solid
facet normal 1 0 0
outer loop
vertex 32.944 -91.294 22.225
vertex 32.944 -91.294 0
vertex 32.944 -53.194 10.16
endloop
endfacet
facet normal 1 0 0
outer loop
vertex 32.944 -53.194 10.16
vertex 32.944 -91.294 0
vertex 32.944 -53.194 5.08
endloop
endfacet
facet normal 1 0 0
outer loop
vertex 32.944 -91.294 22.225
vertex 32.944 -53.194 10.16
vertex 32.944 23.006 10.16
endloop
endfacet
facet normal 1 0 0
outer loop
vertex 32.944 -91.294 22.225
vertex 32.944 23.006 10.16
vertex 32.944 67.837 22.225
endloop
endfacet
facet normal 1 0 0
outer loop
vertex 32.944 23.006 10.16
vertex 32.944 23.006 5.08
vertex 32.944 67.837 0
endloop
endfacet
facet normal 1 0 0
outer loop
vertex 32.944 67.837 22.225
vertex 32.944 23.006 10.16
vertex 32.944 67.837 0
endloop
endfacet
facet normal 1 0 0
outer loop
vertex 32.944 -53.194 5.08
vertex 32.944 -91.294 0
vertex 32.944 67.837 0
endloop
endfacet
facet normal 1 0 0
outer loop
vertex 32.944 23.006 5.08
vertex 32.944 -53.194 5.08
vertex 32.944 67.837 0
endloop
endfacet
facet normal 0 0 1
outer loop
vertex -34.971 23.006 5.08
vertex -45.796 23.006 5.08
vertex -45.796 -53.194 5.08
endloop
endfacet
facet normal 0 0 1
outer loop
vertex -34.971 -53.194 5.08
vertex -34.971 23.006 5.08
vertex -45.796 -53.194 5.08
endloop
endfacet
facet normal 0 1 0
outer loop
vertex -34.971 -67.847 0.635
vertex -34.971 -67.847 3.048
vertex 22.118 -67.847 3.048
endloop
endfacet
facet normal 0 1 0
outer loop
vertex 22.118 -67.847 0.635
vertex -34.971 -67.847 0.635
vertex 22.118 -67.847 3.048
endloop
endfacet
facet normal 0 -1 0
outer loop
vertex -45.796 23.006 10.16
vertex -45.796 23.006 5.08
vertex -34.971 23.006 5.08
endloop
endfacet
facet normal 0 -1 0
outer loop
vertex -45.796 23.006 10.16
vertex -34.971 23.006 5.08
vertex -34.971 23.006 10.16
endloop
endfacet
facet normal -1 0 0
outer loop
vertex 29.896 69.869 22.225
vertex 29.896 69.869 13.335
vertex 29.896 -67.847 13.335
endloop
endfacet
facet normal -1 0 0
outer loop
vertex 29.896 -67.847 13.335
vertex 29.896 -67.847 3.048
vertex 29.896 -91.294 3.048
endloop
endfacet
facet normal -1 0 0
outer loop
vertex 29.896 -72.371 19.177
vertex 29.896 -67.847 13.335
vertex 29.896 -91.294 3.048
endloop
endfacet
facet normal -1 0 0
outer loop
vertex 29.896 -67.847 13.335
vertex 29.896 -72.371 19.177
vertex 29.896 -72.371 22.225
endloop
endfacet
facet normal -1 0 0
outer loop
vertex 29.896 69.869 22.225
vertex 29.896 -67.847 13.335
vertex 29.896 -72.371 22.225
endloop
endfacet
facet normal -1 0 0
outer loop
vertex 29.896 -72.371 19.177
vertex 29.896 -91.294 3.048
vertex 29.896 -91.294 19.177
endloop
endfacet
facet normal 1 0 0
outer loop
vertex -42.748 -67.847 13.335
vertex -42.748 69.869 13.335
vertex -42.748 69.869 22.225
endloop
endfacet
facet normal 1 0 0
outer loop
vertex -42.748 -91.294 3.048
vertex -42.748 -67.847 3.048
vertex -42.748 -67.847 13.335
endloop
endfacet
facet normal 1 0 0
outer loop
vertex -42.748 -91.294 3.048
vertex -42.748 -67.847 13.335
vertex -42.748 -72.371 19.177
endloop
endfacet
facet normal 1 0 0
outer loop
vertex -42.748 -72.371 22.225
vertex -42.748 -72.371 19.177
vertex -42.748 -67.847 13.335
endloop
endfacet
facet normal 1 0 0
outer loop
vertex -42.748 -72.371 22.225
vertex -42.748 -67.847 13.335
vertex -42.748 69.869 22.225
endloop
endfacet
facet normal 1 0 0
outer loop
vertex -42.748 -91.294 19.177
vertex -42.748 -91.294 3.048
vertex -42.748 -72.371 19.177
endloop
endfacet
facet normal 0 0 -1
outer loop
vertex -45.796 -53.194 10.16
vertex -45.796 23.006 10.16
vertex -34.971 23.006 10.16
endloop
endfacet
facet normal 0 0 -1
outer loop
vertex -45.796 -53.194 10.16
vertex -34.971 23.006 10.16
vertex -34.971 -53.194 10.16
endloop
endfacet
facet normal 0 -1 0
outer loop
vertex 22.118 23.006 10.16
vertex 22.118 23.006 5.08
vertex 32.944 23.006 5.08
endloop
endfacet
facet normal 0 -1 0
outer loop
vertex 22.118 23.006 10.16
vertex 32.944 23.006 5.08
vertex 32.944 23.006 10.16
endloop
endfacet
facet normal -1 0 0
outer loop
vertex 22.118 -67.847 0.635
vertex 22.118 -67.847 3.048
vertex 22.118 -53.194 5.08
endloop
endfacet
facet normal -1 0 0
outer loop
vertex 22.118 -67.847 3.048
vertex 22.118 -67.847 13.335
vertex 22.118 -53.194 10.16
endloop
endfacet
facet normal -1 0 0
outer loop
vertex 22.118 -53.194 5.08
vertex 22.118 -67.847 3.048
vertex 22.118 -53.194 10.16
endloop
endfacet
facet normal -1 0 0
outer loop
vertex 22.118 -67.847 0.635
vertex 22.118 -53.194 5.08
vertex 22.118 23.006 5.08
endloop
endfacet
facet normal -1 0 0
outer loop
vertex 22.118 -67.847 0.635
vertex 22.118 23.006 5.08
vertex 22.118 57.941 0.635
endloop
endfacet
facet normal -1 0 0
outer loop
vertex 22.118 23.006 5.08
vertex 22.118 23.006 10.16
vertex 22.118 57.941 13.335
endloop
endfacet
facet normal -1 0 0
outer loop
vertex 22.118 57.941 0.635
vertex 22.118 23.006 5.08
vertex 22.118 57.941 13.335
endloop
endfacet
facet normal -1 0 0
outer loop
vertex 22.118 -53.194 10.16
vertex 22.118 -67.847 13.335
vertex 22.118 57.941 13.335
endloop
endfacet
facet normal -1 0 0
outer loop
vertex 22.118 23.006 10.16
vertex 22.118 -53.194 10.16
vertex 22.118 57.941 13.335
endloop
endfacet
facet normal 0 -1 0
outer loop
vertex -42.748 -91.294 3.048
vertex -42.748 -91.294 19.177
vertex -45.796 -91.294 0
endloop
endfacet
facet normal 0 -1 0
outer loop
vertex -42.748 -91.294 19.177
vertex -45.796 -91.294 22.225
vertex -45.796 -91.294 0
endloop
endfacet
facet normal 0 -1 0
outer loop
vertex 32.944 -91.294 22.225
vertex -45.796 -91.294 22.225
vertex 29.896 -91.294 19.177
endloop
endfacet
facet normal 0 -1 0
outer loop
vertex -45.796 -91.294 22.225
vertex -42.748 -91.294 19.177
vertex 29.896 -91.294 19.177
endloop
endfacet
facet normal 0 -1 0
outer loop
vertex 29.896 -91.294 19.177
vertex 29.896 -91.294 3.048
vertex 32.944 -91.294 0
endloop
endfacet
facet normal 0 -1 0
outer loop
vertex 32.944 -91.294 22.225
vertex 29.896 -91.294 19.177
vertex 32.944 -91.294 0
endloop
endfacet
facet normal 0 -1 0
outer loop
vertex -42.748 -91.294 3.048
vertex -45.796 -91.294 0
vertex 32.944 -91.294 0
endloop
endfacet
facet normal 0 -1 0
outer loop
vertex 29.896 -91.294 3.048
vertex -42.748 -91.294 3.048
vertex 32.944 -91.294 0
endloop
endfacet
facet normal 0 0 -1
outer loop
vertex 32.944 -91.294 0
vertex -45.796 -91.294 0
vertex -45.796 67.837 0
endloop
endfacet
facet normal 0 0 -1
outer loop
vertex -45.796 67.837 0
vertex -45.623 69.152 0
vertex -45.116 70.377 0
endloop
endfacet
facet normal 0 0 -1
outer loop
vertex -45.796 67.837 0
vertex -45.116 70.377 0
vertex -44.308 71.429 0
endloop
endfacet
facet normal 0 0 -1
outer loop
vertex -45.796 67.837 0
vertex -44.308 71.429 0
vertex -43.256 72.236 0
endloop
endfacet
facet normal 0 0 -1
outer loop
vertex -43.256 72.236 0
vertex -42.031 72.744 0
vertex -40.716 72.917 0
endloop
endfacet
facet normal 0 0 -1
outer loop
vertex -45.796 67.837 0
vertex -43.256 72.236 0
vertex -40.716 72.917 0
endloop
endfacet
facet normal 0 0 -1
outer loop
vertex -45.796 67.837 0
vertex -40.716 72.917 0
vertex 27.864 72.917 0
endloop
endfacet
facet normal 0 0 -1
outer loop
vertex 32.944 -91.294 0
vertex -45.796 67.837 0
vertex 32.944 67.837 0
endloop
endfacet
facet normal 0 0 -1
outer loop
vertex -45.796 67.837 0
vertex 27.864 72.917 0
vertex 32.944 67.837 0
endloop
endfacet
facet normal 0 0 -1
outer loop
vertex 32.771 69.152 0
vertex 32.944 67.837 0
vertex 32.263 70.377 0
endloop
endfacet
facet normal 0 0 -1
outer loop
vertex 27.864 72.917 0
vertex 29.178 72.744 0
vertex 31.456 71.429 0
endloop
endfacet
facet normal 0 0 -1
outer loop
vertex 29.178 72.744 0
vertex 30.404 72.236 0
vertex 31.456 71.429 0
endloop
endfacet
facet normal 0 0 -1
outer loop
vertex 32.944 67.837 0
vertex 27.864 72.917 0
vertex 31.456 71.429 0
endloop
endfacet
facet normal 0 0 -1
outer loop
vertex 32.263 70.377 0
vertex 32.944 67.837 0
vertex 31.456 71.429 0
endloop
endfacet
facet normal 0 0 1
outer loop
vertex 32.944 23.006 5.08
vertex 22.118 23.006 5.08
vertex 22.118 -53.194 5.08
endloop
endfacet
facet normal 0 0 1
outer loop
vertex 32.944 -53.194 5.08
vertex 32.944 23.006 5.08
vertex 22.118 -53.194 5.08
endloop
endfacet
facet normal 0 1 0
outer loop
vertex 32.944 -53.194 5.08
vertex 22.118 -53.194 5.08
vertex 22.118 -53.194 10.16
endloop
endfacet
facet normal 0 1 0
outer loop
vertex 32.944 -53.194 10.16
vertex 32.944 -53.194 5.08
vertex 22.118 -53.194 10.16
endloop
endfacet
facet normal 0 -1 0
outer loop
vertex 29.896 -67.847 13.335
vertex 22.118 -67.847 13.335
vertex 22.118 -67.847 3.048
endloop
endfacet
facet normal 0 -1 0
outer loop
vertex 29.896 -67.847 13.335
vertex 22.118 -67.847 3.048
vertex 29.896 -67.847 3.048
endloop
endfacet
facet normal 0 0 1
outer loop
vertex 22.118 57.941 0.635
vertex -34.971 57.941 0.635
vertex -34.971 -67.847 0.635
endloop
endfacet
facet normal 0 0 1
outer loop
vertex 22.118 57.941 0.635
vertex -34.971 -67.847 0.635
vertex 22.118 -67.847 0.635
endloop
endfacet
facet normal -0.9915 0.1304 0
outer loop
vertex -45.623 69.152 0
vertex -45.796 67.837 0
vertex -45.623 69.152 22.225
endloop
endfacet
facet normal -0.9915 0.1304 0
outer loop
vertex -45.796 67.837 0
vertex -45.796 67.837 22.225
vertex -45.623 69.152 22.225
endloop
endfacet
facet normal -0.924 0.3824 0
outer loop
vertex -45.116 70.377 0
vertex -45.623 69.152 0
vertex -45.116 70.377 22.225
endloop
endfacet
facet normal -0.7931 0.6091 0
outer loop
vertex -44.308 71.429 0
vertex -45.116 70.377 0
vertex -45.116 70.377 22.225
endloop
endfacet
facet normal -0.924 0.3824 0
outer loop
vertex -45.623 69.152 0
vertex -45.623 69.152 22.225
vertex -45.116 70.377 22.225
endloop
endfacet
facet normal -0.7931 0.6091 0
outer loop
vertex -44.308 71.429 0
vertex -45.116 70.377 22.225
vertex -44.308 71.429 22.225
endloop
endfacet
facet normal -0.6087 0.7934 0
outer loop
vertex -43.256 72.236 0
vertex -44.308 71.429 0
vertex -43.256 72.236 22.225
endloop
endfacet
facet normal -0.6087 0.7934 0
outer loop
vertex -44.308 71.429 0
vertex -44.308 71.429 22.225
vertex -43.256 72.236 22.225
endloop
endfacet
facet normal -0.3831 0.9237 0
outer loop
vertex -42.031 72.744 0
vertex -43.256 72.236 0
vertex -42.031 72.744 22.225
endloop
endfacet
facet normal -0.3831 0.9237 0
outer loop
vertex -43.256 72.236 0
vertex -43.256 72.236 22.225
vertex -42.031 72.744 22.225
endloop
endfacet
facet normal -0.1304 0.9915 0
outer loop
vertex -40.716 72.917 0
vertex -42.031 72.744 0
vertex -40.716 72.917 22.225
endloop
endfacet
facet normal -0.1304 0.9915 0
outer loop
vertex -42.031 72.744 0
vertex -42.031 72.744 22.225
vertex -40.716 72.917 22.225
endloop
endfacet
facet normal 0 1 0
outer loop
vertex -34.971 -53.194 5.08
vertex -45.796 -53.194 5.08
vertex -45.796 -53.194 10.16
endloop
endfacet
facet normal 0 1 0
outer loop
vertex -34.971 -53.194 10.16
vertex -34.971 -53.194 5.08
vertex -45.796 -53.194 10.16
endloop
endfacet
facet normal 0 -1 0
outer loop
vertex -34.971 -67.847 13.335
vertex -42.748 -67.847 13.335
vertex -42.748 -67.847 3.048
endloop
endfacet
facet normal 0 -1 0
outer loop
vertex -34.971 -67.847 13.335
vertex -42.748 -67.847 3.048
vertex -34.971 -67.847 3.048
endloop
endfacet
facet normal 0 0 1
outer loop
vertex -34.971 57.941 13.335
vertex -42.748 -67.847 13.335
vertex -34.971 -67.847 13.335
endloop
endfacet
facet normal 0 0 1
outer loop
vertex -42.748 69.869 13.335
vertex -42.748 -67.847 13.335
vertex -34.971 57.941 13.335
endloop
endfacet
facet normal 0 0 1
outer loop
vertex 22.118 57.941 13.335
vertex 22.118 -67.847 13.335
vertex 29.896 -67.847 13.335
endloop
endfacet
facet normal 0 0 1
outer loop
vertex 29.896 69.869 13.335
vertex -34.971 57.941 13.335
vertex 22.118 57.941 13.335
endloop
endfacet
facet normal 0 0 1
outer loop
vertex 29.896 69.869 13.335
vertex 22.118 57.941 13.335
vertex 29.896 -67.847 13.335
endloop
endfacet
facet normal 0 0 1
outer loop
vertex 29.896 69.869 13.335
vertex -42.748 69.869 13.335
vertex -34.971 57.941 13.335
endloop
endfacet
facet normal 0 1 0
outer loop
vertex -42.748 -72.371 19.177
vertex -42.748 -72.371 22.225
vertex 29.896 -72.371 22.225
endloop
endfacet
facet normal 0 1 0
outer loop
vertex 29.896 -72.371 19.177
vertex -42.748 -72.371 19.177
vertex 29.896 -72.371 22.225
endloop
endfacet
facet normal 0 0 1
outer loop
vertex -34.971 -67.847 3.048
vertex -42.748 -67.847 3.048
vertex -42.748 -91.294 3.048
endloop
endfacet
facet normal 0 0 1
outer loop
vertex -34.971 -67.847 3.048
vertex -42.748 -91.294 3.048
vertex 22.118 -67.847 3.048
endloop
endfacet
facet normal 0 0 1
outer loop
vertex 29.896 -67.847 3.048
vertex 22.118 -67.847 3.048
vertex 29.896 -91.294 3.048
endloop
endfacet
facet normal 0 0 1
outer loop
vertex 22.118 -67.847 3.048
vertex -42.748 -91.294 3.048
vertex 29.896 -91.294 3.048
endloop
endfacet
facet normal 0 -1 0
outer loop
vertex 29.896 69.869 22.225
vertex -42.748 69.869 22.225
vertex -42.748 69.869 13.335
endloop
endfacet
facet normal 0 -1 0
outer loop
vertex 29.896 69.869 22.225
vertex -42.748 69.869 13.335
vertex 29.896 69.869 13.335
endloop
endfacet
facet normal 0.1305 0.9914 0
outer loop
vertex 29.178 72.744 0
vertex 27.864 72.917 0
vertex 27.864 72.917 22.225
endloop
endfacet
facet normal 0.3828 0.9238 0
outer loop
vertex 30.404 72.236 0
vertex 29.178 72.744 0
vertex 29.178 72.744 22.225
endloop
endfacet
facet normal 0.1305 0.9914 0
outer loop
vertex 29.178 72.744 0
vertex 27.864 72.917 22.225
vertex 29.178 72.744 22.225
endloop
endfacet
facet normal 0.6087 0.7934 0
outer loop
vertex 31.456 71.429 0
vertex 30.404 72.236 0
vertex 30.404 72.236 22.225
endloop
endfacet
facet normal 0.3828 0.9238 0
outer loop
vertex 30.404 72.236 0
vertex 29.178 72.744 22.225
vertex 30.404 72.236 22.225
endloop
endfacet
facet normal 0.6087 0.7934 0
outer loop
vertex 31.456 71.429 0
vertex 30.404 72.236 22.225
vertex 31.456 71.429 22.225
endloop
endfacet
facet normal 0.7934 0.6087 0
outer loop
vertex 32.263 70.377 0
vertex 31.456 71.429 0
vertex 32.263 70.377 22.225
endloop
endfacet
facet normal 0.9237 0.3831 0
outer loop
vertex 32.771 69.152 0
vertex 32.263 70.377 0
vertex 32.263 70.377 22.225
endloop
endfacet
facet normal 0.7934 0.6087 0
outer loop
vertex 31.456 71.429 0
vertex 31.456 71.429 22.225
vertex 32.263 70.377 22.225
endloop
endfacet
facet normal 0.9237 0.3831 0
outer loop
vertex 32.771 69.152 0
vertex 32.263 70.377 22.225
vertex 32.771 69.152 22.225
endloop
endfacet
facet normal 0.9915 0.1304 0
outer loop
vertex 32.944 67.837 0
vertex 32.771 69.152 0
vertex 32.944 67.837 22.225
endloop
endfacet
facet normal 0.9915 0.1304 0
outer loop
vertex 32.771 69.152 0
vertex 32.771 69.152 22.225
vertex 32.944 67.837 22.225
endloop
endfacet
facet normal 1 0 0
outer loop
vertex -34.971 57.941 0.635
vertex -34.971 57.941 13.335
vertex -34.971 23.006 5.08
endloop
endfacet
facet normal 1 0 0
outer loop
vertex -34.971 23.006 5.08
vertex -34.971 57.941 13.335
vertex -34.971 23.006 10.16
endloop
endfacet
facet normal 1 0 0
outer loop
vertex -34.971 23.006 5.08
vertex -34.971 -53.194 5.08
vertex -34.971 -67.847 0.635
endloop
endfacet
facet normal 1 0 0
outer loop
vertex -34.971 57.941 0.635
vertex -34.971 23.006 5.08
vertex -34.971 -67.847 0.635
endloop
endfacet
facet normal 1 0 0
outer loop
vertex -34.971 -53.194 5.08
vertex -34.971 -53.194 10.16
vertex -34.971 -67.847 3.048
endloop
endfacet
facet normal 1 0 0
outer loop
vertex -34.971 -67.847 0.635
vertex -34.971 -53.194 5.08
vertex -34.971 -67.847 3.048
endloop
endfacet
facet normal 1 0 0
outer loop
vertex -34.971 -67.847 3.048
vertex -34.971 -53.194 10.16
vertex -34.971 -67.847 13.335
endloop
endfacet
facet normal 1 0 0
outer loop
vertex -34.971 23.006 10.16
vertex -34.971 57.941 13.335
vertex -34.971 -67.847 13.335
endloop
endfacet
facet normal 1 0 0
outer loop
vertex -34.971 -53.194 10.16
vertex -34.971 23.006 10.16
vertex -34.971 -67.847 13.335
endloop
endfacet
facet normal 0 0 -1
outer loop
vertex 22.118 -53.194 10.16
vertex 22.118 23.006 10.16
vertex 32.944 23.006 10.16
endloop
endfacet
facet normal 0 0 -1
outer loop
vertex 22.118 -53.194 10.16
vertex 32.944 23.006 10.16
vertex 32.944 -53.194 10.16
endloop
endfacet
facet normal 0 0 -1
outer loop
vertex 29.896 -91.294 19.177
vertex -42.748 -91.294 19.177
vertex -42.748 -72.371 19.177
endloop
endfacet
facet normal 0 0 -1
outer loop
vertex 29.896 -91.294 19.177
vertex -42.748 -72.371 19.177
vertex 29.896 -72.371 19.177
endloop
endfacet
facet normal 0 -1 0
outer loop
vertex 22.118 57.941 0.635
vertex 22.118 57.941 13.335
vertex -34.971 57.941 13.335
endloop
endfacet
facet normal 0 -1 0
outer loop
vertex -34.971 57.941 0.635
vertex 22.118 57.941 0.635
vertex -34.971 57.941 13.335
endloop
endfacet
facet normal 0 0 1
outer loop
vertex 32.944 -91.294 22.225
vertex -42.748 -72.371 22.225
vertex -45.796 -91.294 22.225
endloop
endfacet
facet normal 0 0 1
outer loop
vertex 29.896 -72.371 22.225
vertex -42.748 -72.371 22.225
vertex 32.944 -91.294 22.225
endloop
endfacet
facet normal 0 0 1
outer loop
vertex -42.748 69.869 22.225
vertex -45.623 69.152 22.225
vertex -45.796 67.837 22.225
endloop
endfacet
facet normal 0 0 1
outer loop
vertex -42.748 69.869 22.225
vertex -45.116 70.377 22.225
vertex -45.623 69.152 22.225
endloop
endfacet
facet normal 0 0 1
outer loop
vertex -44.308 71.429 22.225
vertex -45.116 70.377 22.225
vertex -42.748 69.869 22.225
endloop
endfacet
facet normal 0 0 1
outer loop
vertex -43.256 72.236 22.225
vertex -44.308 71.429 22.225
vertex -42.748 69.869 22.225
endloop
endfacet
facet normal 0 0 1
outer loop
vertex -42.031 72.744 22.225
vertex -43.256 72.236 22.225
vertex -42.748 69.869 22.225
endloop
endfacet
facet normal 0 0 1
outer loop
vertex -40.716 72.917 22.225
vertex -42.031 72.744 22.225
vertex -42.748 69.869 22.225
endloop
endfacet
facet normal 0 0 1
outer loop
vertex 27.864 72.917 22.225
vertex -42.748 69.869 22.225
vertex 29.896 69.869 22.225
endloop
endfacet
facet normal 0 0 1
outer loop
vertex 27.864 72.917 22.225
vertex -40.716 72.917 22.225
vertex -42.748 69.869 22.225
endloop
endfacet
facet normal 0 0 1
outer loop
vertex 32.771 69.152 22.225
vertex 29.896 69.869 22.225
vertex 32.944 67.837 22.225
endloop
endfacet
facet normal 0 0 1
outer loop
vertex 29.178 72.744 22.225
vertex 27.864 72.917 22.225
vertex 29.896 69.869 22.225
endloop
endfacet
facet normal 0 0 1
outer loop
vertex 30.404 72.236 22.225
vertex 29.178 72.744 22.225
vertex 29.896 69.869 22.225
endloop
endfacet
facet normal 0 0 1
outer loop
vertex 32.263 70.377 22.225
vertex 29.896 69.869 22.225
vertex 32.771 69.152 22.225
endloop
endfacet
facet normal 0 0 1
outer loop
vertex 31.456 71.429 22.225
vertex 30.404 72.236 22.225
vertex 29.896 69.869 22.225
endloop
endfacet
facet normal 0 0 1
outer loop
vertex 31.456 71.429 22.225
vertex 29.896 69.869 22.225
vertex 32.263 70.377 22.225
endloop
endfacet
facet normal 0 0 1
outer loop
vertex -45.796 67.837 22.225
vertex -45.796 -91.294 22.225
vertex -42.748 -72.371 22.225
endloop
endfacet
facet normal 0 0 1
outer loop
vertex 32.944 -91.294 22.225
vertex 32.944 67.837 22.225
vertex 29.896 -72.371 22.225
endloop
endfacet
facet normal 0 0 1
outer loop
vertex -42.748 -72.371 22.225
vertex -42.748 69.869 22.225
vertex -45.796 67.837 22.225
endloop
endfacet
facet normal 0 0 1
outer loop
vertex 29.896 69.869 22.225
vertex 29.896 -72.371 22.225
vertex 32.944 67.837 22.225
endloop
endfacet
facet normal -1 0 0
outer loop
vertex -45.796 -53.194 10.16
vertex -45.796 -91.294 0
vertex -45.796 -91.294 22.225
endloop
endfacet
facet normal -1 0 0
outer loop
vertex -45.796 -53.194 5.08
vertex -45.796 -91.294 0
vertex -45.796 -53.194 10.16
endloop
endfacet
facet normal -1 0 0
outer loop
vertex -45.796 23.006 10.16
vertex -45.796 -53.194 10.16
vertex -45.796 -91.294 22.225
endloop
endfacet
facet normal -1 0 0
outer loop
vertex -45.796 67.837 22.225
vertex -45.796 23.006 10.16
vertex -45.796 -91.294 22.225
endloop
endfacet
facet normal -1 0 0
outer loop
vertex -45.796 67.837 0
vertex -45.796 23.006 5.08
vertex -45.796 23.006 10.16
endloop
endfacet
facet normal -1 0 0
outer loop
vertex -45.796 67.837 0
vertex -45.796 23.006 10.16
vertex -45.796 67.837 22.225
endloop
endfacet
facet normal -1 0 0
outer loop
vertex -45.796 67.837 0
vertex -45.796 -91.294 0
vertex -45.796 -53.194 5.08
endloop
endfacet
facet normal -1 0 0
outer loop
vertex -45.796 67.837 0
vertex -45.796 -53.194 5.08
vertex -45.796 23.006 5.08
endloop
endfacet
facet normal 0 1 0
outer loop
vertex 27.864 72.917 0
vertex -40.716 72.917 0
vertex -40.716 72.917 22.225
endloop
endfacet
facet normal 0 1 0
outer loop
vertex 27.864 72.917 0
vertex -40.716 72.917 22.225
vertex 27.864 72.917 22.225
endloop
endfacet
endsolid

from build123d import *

# Parameters (mm, degrees)
F0_W      = 78.74
F0_H      = 148.336
F1_DEPTH  = 22.225
F2_W      = 72.644
F2_H      = 142.24
F3_DEPTH  = 8.89
F5_DEPTH  = 12.7
F0_H_2    = 15.875
F6_DEPTH  = 22.225
F7_W      = 72.644
F7_H      = 16.129
F8_DEPTH  = 23.447496
F9_W      = 76.2
F9_H      = 5.08
F10_DEPTH = 78.74
F11_R     = 5.08


with BuildPart() as f1:
    # F0 (on Top) → F1 (new body)
    with BuildSketch(Plane.XY):
        with Locations((-6.426373, -1.251059)):
            Rectangle(F0_W, F0_H)
    extrude(amount=F1_DEPTH)

    # F2 (on face) → F3 (cut)
    with BuildSketch(Plane.XY.offset(22.225)):
        with Locations((-6.426373, -1.251059)):
            Rectangle(F2_W, F2_H)
    extrude(amount=-F3_DEPTH, mode=Mode.SUBTRACT)

    # F4 (on face) → F5 (cut)
    with BuildSketch(Plane.XY.offset(13.335)):
        Polygon((-6.426373, 57.940908), (-34.970604, 57.940908), (-34.970604, -67.846563), (22.117858, -67.846563), (22.117858, 57.940908), align=None)
    extrude(amount=-F5_DEPTH, mode=Mode.SUBTRACT)

    # F0 (on Top) → F6 (join)
    with BuildSketch(Plane.XY):
        with Locations((-6.426373, -83.356559)):
            Rectangle(F0_W, F0_H_2)
    extrude(amount=F6_DEPTH)

    # F7 (on face) → F8 (cut, through all)
    with BuildSketch(Plane.XZ.offset(91.294059)):
        with Locations((-6.426373, 11.1125)):
            Rectangle(F7_W, F7_H)
    extrude(amount=-F8_DEPTH, mode=Mode.SUBTRACT)

    # F9 (on face) → F10 (cut, through all)
    with BuildSketch(Plane(origin=(-45.796373, 0, 0), x_dir=(0, -1, 0), z_dir=(-1, 0, 0))):
        with Locations((15.094059, 7.62)):
            Rectangle(F9_W, F9_H)
    extrude(amount=-F10_DEPTH, mode=Mode.SUBTRACT)

    # F11
    f11_edges = [f1.edges().sort_by_distance(p)[0] for p in [
        (-45.796373, 72.916941, 11.1125),
        (32.943627, 72.916941, 11.1125),
    ]]
    fillet(f11_edges, radius=F11_R)


solid = f1.part
